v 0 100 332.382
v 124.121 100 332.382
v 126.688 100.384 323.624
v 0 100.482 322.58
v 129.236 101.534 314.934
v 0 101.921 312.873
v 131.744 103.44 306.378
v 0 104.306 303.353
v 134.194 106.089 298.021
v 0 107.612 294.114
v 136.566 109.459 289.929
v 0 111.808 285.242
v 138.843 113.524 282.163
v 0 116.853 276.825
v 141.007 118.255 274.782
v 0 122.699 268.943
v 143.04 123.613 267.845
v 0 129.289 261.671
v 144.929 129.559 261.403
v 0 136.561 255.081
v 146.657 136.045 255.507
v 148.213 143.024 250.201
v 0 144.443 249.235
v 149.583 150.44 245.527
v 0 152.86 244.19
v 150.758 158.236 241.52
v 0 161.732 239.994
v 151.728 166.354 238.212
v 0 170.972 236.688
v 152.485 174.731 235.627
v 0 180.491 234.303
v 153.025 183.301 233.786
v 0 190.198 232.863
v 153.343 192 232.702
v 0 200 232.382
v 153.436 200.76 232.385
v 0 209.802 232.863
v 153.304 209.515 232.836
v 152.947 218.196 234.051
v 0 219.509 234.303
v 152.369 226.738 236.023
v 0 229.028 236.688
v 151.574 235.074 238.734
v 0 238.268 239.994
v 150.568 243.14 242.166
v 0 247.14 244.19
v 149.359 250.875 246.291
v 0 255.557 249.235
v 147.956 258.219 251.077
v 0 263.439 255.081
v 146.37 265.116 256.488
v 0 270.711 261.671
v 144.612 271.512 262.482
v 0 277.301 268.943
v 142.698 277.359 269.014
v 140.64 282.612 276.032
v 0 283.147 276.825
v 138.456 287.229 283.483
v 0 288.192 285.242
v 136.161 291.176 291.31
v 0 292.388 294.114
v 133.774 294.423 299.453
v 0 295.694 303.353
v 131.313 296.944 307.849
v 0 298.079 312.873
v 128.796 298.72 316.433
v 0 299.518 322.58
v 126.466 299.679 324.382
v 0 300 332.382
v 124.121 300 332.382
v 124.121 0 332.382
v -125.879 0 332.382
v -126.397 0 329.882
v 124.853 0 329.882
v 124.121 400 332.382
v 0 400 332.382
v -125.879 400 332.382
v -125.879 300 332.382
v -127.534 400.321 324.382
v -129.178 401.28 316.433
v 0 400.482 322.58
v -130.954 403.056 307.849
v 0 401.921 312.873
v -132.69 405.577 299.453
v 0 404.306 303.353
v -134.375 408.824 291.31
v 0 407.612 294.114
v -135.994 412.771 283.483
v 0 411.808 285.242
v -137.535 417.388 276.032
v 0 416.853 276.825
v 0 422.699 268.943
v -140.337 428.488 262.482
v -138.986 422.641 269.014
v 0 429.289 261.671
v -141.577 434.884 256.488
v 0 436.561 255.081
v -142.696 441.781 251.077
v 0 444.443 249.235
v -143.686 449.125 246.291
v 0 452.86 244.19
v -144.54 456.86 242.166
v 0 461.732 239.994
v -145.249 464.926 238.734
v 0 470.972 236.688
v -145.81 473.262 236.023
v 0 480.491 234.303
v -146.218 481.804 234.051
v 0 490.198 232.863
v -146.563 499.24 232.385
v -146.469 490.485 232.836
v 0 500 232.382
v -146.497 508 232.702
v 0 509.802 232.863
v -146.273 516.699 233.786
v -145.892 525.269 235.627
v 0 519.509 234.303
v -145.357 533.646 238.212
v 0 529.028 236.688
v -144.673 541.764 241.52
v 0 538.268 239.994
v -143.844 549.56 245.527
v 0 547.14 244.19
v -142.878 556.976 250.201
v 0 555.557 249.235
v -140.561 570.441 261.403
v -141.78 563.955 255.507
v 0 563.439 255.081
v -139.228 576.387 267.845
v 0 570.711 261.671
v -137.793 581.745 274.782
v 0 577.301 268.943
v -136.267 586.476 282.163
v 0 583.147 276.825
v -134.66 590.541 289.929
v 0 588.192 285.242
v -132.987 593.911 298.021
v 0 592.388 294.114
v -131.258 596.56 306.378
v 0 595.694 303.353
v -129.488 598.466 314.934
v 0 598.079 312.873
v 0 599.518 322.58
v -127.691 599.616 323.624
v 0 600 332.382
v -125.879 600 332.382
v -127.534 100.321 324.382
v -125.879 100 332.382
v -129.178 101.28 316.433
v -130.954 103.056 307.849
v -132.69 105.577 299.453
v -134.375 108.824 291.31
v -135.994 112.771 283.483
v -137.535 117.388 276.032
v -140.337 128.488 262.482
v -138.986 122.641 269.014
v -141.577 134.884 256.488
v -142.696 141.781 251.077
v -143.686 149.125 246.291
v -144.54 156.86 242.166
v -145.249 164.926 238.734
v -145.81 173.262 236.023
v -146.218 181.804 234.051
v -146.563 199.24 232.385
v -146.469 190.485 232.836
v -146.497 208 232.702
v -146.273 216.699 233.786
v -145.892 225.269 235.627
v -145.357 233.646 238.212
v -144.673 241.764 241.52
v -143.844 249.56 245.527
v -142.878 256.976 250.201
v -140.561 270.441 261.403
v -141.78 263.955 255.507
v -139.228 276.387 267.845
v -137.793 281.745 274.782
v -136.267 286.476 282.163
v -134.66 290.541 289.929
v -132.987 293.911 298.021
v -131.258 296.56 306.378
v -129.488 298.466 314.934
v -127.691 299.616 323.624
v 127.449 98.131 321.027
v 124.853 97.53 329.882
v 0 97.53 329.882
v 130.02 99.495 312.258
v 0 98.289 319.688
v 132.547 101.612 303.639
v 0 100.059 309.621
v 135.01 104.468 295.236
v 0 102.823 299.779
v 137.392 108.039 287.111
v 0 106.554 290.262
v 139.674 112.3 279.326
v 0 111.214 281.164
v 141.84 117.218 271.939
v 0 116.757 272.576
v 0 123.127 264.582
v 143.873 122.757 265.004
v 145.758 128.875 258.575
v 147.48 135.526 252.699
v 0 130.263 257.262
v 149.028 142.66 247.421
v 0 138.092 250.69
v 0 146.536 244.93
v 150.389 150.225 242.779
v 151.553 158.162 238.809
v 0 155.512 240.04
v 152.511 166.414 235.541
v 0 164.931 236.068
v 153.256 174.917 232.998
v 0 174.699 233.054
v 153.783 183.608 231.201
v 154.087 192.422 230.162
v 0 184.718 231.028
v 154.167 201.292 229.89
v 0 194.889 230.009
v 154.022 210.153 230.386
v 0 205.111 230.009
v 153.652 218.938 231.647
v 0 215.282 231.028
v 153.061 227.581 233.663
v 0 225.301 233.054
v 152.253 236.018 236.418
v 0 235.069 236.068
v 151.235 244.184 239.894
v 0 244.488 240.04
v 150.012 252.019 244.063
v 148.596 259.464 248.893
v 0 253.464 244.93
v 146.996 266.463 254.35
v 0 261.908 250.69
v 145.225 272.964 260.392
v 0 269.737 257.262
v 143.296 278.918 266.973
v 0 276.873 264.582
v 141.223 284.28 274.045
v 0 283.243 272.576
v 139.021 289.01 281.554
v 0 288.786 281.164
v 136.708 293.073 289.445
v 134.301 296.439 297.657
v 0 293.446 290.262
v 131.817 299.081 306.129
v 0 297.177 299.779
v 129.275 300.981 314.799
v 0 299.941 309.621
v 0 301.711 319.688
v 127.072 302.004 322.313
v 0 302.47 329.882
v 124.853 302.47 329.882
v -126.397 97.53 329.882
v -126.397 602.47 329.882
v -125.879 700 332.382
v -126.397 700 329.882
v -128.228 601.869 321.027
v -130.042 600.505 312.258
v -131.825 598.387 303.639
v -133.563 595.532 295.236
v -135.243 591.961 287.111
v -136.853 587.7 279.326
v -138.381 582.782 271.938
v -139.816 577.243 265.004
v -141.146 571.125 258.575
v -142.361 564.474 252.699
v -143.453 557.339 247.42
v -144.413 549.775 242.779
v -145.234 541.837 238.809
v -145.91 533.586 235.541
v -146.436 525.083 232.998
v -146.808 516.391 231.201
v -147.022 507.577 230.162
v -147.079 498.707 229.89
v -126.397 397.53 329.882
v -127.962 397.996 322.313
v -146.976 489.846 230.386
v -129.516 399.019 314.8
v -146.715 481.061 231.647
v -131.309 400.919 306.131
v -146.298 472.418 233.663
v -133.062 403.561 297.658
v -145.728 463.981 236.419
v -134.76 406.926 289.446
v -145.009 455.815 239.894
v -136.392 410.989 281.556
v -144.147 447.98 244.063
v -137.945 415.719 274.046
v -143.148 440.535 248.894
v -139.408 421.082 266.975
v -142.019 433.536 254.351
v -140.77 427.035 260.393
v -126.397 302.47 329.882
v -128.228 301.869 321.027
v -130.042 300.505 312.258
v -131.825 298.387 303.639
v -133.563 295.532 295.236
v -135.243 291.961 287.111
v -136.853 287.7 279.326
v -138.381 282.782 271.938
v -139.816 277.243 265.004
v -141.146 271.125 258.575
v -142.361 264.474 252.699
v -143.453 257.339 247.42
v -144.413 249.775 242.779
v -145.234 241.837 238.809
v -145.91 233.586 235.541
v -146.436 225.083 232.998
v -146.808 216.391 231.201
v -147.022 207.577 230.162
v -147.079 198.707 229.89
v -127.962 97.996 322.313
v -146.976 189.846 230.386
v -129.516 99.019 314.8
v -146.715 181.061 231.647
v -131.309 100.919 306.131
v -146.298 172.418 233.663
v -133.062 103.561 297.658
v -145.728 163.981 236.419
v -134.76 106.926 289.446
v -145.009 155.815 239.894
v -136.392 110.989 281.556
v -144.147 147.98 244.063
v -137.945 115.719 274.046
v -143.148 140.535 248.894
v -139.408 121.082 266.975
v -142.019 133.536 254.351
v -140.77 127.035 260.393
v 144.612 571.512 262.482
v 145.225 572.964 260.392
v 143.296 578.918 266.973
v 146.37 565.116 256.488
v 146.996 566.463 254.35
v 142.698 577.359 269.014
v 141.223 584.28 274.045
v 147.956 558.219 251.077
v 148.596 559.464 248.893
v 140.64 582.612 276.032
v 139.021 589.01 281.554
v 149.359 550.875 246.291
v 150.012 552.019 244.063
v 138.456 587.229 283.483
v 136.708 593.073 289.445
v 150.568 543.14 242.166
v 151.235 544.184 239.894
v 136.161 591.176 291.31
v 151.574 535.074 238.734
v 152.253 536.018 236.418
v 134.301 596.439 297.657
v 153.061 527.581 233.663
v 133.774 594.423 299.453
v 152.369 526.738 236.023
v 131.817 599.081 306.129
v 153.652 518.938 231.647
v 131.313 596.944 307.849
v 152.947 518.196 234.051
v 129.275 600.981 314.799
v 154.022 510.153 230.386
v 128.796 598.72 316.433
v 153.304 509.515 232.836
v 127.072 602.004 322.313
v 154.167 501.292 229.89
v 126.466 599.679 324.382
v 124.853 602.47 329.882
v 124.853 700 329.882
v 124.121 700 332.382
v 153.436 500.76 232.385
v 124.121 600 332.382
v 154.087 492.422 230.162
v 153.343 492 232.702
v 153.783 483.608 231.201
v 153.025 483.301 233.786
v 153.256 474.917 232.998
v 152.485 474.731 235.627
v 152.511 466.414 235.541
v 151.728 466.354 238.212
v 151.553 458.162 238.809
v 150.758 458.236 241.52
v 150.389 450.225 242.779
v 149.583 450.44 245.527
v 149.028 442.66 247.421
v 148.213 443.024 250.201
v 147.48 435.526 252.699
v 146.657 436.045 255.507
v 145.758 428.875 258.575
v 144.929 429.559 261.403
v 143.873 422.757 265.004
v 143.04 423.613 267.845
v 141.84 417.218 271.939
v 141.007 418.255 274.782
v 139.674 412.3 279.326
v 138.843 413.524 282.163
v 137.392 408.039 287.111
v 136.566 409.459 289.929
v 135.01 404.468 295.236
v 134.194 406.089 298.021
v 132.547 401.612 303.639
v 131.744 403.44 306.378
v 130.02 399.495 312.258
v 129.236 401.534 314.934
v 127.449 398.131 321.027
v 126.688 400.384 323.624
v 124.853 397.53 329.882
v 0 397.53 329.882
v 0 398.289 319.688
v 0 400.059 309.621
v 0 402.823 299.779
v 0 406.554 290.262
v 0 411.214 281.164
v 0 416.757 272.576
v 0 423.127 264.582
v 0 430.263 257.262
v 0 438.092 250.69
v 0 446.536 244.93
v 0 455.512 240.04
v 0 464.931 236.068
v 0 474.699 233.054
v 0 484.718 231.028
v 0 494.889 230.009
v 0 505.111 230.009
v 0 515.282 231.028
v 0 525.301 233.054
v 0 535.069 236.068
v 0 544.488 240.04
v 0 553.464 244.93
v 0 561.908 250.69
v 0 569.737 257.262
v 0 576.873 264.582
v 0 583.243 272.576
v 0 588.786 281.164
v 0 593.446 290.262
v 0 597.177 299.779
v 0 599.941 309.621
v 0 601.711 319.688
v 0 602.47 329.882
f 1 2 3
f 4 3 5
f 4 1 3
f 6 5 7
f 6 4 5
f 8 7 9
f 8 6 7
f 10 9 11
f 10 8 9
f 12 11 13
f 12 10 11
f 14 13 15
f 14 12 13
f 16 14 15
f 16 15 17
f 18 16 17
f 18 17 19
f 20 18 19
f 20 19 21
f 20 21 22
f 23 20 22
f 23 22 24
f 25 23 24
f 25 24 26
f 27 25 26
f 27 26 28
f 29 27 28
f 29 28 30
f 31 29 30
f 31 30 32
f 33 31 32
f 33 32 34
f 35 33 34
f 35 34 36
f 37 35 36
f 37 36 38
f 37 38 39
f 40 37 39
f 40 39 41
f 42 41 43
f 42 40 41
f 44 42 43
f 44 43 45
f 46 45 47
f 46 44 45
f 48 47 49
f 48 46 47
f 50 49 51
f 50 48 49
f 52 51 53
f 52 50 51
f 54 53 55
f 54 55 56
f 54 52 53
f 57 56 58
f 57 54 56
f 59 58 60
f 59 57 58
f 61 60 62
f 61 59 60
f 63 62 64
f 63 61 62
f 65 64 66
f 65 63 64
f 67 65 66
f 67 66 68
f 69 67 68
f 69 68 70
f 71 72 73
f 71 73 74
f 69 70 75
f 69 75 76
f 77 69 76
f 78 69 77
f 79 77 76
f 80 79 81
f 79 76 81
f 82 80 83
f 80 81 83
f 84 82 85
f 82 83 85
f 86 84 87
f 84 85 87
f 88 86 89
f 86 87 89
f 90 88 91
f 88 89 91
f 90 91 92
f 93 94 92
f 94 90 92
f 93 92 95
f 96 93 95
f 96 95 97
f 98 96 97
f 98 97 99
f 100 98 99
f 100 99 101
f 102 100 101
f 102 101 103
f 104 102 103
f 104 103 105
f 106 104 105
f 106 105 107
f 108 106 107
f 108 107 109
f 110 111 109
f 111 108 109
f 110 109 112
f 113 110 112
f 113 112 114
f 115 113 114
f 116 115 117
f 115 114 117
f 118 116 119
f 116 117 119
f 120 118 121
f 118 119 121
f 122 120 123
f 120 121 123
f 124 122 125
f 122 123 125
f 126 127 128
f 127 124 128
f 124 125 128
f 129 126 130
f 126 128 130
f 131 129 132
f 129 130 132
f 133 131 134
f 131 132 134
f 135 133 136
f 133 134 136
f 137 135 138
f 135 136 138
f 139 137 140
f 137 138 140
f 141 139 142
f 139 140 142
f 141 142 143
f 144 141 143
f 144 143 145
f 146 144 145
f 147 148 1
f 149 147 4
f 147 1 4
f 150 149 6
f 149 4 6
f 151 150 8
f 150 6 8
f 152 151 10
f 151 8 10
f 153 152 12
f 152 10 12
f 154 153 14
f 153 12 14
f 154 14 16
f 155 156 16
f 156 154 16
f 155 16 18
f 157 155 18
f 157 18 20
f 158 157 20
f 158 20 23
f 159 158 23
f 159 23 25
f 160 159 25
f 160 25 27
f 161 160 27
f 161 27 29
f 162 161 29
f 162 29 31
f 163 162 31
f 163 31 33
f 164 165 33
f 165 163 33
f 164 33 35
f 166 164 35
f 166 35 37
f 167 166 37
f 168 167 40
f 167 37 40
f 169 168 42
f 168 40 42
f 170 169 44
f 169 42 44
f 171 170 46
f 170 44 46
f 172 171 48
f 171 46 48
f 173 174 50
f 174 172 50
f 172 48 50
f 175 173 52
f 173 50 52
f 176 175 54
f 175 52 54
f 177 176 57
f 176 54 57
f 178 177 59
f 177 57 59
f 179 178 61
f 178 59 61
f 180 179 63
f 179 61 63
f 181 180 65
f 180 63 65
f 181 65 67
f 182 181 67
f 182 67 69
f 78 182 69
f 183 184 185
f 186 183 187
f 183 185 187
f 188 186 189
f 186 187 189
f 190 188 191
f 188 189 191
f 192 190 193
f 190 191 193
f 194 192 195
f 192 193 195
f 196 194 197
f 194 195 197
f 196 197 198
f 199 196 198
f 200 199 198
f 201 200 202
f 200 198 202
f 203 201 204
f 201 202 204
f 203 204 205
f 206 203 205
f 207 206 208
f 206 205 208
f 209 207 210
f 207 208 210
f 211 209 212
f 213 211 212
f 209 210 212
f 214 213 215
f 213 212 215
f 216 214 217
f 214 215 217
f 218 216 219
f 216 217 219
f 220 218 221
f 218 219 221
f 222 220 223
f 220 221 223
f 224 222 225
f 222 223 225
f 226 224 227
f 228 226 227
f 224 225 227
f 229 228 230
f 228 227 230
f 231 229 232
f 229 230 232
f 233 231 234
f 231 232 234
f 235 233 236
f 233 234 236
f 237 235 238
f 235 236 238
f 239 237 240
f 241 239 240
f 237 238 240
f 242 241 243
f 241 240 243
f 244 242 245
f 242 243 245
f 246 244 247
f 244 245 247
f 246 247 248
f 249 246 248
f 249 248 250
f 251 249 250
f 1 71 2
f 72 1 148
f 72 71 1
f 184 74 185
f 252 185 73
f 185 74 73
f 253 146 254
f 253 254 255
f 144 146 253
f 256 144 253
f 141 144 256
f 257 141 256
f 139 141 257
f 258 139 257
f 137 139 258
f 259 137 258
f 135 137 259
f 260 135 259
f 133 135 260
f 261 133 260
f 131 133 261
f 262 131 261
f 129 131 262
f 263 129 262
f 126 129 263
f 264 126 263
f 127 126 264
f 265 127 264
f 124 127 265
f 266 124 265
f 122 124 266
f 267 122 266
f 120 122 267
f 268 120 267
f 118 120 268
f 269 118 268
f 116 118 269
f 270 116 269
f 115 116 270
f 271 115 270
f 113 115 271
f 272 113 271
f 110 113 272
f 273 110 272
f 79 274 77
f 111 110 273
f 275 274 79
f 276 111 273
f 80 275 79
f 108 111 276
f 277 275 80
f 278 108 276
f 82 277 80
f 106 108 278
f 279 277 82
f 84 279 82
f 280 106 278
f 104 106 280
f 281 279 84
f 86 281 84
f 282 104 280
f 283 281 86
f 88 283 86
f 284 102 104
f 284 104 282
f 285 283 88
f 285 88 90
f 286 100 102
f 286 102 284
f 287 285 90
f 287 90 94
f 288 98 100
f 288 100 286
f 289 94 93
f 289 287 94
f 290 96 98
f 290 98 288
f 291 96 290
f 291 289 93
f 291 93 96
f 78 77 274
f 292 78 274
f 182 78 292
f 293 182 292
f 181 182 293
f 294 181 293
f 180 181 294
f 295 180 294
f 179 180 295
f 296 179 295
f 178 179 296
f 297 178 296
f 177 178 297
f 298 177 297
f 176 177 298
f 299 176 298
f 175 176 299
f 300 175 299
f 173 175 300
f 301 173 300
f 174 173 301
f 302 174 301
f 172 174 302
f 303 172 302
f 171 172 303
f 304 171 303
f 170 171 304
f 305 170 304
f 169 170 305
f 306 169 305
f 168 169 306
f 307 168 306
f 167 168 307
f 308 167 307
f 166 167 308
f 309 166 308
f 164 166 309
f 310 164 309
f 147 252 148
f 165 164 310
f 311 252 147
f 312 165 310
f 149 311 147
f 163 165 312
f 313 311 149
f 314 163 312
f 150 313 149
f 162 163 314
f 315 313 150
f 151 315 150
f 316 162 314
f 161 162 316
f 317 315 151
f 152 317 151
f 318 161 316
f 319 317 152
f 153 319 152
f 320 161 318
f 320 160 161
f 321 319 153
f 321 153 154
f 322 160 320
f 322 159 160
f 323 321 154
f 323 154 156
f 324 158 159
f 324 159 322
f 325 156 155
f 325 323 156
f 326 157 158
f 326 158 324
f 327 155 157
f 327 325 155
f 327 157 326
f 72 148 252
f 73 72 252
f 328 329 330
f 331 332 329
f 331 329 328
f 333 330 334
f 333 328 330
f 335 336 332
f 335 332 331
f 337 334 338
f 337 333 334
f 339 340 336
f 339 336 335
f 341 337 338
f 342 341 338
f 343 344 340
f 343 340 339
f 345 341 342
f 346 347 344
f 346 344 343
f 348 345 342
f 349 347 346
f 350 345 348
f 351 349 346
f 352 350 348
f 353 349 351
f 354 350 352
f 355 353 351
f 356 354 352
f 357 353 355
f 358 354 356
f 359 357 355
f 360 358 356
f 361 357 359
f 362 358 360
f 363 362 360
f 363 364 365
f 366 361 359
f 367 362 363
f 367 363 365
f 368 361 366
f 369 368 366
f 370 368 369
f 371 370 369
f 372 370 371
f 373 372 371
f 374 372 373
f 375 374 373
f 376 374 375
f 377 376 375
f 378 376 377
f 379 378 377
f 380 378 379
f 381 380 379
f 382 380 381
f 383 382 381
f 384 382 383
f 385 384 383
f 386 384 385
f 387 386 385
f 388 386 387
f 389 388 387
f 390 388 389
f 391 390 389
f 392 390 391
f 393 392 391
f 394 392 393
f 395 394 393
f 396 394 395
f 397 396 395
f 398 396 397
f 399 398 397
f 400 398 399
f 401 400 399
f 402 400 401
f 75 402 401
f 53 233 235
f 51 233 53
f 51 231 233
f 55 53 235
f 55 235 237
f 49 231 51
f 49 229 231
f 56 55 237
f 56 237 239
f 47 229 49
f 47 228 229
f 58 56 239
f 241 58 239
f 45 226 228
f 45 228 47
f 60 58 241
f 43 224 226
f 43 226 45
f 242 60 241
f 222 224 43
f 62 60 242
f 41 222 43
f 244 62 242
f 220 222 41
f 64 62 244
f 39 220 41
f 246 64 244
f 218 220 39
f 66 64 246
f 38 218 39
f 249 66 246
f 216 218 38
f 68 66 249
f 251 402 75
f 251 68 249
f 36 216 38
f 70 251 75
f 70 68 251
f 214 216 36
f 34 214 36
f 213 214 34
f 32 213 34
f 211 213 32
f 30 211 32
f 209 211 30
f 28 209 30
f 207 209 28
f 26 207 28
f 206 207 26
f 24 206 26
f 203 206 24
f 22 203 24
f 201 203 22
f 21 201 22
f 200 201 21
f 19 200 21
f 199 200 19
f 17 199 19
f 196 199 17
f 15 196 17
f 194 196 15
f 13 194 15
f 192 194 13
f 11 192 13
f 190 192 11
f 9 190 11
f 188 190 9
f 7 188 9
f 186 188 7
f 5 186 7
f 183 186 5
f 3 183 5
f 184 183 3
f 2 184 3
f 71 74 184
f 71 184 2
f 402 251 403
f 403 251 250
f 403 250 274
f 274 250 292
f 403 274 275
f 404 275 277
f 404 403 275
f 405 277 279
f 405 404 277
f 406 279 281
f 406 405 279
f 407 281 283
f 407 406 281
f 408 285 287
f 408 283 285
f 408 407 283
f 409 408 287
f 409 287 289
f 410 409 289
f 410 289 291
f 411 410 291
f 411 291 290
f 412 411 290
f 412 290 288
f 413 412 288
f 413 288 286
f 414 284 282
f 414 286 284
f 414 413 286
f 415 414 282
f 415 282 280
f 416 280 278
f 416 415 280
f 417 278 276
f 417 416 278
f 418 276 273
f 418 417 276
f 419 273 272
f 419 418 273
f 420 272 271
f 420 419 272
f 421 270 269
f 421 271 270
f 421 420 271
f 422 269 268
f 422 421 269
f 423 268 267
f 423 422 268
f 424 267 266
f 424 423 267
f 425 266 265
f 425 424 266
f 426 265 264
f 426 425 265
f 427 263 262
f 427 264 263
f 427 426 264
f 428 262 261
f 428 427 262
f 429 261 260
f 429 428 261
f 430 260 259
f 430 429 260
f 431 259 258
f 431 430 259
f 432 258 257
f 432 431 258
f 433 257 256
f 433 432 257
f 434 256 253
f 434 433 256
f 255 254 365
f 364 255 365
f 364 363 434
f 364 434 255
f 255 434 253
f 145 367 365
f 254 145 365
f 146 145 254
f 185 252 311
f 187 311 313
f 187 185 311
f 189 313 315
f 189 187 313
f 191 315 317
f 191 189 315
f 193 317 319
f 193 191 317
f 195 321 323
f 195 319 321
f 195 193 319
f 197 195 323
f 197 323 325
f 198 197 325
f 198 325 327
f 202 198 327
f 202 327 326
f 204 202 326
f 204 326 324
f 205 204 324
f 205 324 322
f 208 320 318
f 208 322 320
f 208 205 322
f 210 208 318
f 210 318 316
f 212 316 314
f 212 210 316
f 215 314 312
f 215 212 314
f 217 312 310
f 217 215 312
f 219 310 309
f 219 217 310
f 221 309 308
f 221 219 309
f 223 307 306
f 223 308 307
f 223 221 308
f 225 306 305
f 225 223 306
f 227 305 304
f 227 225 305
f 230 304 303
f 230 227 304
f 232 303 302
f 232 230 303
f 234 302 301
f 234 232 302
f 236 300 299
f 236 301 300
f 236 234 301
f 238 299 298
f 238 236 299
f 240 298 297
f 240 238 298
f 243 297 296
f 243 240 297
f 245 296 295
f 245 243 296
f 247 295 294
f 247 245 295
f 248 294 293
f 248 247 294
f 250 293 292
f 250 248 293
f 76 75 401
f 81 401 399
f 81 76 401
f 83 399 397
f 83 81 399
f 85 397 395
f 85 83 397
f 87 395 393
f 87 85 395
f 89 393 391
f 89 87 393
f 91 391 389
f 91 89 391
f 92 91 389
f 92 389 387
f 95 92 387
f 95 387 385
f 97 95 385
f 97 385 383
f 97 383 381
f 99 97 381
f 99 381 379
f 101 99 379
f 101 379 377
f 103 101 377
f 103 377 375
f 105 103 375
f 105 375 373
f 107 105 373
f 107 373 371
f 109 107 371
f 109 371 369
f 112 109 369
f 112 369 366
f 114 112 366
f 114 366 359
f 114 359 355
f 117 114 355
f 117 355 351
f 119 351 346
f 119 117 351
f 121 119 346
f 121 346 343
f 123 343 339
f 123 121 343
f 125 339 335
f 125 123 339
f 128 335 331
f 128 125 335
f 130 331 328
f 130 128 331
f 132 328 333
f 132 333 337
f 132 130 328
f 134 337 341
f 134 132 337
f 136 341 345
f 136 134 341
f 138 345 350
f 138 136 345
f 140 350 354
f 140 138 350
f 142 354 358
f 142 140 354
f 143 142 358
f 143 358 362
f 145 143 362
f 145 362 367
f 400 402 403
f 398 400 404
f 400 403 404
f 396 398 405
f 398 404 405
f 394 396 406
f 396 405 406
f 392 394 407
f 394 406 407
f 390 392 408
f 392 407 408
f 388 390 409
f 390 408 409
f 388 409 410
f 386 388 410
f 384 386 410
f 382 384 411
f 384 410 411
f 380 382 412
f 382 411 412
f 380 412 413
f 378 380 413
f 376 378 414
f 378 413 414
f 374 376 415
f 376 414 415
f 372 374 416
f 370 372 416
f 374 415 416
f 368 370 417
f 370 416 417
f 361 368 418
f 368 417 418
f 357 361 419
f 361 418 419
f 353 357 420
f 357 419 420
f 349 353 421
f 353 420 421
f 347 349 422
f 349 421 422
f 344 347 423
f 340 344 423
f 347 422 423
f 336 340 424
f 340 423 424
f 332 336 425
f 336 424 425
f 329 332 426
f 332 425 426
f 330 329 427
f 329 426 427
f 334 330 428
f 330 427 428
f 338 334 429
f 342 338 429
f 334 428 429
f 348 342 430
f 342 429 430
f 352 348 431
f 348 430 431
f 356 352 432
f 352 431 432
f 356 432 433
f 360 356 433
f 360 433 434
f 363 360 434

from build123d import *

# Parameters (mm, degrees)
F1_DEPTH      = 700
F2_R          = 100
F3_DEPTH      = 400
F3_DEPTH_BACK = 310
F4_T          = -2.5


with BuildPart() as f1:
    # F0 (on Front) → F1 (new body)
    with BuildSketch(Plane.XZ):
        Polygon((270.7016063785, -167.6180982615), (124.1205126206, 332.3819017385), (-125.8794873794, 332.3819017385), (-229.2983936215, -167.6180982615), align=None)
    extrude(amount=-F1_DEPTH)

    # F2 (on Right) → F3 (cut, two sides)
    with BuildSketch(Plane.YZ) as f3_sk:
        with Locations((200, 332.3819017385)):
            Circle(F2_R)
        with Locations((500, 332.3819017385)):
            Circle(F2_R)
    extrude(amount=-F3_DEPTH, mode=Mode.SUBTRACT)
    extrude(f3_sk.sketch, amount=F3_DEPTH_BACK, mode=Mode.SUBTRACT)

    # F4
    f4_openings = [f1.faces().sort_by_distance(p)[0] for p in [
        (11.110009, 0, 54.604124),
        (203.411383, 350, 61.914311),
        (20.701606, 350, -167.618098),
        (-181.822412, 350, 61.914311),
        (11.110009, 700, 54.604124),
    ]]
    offset(amount=F4_T, openings=f4_openings)


solid = f1.part
